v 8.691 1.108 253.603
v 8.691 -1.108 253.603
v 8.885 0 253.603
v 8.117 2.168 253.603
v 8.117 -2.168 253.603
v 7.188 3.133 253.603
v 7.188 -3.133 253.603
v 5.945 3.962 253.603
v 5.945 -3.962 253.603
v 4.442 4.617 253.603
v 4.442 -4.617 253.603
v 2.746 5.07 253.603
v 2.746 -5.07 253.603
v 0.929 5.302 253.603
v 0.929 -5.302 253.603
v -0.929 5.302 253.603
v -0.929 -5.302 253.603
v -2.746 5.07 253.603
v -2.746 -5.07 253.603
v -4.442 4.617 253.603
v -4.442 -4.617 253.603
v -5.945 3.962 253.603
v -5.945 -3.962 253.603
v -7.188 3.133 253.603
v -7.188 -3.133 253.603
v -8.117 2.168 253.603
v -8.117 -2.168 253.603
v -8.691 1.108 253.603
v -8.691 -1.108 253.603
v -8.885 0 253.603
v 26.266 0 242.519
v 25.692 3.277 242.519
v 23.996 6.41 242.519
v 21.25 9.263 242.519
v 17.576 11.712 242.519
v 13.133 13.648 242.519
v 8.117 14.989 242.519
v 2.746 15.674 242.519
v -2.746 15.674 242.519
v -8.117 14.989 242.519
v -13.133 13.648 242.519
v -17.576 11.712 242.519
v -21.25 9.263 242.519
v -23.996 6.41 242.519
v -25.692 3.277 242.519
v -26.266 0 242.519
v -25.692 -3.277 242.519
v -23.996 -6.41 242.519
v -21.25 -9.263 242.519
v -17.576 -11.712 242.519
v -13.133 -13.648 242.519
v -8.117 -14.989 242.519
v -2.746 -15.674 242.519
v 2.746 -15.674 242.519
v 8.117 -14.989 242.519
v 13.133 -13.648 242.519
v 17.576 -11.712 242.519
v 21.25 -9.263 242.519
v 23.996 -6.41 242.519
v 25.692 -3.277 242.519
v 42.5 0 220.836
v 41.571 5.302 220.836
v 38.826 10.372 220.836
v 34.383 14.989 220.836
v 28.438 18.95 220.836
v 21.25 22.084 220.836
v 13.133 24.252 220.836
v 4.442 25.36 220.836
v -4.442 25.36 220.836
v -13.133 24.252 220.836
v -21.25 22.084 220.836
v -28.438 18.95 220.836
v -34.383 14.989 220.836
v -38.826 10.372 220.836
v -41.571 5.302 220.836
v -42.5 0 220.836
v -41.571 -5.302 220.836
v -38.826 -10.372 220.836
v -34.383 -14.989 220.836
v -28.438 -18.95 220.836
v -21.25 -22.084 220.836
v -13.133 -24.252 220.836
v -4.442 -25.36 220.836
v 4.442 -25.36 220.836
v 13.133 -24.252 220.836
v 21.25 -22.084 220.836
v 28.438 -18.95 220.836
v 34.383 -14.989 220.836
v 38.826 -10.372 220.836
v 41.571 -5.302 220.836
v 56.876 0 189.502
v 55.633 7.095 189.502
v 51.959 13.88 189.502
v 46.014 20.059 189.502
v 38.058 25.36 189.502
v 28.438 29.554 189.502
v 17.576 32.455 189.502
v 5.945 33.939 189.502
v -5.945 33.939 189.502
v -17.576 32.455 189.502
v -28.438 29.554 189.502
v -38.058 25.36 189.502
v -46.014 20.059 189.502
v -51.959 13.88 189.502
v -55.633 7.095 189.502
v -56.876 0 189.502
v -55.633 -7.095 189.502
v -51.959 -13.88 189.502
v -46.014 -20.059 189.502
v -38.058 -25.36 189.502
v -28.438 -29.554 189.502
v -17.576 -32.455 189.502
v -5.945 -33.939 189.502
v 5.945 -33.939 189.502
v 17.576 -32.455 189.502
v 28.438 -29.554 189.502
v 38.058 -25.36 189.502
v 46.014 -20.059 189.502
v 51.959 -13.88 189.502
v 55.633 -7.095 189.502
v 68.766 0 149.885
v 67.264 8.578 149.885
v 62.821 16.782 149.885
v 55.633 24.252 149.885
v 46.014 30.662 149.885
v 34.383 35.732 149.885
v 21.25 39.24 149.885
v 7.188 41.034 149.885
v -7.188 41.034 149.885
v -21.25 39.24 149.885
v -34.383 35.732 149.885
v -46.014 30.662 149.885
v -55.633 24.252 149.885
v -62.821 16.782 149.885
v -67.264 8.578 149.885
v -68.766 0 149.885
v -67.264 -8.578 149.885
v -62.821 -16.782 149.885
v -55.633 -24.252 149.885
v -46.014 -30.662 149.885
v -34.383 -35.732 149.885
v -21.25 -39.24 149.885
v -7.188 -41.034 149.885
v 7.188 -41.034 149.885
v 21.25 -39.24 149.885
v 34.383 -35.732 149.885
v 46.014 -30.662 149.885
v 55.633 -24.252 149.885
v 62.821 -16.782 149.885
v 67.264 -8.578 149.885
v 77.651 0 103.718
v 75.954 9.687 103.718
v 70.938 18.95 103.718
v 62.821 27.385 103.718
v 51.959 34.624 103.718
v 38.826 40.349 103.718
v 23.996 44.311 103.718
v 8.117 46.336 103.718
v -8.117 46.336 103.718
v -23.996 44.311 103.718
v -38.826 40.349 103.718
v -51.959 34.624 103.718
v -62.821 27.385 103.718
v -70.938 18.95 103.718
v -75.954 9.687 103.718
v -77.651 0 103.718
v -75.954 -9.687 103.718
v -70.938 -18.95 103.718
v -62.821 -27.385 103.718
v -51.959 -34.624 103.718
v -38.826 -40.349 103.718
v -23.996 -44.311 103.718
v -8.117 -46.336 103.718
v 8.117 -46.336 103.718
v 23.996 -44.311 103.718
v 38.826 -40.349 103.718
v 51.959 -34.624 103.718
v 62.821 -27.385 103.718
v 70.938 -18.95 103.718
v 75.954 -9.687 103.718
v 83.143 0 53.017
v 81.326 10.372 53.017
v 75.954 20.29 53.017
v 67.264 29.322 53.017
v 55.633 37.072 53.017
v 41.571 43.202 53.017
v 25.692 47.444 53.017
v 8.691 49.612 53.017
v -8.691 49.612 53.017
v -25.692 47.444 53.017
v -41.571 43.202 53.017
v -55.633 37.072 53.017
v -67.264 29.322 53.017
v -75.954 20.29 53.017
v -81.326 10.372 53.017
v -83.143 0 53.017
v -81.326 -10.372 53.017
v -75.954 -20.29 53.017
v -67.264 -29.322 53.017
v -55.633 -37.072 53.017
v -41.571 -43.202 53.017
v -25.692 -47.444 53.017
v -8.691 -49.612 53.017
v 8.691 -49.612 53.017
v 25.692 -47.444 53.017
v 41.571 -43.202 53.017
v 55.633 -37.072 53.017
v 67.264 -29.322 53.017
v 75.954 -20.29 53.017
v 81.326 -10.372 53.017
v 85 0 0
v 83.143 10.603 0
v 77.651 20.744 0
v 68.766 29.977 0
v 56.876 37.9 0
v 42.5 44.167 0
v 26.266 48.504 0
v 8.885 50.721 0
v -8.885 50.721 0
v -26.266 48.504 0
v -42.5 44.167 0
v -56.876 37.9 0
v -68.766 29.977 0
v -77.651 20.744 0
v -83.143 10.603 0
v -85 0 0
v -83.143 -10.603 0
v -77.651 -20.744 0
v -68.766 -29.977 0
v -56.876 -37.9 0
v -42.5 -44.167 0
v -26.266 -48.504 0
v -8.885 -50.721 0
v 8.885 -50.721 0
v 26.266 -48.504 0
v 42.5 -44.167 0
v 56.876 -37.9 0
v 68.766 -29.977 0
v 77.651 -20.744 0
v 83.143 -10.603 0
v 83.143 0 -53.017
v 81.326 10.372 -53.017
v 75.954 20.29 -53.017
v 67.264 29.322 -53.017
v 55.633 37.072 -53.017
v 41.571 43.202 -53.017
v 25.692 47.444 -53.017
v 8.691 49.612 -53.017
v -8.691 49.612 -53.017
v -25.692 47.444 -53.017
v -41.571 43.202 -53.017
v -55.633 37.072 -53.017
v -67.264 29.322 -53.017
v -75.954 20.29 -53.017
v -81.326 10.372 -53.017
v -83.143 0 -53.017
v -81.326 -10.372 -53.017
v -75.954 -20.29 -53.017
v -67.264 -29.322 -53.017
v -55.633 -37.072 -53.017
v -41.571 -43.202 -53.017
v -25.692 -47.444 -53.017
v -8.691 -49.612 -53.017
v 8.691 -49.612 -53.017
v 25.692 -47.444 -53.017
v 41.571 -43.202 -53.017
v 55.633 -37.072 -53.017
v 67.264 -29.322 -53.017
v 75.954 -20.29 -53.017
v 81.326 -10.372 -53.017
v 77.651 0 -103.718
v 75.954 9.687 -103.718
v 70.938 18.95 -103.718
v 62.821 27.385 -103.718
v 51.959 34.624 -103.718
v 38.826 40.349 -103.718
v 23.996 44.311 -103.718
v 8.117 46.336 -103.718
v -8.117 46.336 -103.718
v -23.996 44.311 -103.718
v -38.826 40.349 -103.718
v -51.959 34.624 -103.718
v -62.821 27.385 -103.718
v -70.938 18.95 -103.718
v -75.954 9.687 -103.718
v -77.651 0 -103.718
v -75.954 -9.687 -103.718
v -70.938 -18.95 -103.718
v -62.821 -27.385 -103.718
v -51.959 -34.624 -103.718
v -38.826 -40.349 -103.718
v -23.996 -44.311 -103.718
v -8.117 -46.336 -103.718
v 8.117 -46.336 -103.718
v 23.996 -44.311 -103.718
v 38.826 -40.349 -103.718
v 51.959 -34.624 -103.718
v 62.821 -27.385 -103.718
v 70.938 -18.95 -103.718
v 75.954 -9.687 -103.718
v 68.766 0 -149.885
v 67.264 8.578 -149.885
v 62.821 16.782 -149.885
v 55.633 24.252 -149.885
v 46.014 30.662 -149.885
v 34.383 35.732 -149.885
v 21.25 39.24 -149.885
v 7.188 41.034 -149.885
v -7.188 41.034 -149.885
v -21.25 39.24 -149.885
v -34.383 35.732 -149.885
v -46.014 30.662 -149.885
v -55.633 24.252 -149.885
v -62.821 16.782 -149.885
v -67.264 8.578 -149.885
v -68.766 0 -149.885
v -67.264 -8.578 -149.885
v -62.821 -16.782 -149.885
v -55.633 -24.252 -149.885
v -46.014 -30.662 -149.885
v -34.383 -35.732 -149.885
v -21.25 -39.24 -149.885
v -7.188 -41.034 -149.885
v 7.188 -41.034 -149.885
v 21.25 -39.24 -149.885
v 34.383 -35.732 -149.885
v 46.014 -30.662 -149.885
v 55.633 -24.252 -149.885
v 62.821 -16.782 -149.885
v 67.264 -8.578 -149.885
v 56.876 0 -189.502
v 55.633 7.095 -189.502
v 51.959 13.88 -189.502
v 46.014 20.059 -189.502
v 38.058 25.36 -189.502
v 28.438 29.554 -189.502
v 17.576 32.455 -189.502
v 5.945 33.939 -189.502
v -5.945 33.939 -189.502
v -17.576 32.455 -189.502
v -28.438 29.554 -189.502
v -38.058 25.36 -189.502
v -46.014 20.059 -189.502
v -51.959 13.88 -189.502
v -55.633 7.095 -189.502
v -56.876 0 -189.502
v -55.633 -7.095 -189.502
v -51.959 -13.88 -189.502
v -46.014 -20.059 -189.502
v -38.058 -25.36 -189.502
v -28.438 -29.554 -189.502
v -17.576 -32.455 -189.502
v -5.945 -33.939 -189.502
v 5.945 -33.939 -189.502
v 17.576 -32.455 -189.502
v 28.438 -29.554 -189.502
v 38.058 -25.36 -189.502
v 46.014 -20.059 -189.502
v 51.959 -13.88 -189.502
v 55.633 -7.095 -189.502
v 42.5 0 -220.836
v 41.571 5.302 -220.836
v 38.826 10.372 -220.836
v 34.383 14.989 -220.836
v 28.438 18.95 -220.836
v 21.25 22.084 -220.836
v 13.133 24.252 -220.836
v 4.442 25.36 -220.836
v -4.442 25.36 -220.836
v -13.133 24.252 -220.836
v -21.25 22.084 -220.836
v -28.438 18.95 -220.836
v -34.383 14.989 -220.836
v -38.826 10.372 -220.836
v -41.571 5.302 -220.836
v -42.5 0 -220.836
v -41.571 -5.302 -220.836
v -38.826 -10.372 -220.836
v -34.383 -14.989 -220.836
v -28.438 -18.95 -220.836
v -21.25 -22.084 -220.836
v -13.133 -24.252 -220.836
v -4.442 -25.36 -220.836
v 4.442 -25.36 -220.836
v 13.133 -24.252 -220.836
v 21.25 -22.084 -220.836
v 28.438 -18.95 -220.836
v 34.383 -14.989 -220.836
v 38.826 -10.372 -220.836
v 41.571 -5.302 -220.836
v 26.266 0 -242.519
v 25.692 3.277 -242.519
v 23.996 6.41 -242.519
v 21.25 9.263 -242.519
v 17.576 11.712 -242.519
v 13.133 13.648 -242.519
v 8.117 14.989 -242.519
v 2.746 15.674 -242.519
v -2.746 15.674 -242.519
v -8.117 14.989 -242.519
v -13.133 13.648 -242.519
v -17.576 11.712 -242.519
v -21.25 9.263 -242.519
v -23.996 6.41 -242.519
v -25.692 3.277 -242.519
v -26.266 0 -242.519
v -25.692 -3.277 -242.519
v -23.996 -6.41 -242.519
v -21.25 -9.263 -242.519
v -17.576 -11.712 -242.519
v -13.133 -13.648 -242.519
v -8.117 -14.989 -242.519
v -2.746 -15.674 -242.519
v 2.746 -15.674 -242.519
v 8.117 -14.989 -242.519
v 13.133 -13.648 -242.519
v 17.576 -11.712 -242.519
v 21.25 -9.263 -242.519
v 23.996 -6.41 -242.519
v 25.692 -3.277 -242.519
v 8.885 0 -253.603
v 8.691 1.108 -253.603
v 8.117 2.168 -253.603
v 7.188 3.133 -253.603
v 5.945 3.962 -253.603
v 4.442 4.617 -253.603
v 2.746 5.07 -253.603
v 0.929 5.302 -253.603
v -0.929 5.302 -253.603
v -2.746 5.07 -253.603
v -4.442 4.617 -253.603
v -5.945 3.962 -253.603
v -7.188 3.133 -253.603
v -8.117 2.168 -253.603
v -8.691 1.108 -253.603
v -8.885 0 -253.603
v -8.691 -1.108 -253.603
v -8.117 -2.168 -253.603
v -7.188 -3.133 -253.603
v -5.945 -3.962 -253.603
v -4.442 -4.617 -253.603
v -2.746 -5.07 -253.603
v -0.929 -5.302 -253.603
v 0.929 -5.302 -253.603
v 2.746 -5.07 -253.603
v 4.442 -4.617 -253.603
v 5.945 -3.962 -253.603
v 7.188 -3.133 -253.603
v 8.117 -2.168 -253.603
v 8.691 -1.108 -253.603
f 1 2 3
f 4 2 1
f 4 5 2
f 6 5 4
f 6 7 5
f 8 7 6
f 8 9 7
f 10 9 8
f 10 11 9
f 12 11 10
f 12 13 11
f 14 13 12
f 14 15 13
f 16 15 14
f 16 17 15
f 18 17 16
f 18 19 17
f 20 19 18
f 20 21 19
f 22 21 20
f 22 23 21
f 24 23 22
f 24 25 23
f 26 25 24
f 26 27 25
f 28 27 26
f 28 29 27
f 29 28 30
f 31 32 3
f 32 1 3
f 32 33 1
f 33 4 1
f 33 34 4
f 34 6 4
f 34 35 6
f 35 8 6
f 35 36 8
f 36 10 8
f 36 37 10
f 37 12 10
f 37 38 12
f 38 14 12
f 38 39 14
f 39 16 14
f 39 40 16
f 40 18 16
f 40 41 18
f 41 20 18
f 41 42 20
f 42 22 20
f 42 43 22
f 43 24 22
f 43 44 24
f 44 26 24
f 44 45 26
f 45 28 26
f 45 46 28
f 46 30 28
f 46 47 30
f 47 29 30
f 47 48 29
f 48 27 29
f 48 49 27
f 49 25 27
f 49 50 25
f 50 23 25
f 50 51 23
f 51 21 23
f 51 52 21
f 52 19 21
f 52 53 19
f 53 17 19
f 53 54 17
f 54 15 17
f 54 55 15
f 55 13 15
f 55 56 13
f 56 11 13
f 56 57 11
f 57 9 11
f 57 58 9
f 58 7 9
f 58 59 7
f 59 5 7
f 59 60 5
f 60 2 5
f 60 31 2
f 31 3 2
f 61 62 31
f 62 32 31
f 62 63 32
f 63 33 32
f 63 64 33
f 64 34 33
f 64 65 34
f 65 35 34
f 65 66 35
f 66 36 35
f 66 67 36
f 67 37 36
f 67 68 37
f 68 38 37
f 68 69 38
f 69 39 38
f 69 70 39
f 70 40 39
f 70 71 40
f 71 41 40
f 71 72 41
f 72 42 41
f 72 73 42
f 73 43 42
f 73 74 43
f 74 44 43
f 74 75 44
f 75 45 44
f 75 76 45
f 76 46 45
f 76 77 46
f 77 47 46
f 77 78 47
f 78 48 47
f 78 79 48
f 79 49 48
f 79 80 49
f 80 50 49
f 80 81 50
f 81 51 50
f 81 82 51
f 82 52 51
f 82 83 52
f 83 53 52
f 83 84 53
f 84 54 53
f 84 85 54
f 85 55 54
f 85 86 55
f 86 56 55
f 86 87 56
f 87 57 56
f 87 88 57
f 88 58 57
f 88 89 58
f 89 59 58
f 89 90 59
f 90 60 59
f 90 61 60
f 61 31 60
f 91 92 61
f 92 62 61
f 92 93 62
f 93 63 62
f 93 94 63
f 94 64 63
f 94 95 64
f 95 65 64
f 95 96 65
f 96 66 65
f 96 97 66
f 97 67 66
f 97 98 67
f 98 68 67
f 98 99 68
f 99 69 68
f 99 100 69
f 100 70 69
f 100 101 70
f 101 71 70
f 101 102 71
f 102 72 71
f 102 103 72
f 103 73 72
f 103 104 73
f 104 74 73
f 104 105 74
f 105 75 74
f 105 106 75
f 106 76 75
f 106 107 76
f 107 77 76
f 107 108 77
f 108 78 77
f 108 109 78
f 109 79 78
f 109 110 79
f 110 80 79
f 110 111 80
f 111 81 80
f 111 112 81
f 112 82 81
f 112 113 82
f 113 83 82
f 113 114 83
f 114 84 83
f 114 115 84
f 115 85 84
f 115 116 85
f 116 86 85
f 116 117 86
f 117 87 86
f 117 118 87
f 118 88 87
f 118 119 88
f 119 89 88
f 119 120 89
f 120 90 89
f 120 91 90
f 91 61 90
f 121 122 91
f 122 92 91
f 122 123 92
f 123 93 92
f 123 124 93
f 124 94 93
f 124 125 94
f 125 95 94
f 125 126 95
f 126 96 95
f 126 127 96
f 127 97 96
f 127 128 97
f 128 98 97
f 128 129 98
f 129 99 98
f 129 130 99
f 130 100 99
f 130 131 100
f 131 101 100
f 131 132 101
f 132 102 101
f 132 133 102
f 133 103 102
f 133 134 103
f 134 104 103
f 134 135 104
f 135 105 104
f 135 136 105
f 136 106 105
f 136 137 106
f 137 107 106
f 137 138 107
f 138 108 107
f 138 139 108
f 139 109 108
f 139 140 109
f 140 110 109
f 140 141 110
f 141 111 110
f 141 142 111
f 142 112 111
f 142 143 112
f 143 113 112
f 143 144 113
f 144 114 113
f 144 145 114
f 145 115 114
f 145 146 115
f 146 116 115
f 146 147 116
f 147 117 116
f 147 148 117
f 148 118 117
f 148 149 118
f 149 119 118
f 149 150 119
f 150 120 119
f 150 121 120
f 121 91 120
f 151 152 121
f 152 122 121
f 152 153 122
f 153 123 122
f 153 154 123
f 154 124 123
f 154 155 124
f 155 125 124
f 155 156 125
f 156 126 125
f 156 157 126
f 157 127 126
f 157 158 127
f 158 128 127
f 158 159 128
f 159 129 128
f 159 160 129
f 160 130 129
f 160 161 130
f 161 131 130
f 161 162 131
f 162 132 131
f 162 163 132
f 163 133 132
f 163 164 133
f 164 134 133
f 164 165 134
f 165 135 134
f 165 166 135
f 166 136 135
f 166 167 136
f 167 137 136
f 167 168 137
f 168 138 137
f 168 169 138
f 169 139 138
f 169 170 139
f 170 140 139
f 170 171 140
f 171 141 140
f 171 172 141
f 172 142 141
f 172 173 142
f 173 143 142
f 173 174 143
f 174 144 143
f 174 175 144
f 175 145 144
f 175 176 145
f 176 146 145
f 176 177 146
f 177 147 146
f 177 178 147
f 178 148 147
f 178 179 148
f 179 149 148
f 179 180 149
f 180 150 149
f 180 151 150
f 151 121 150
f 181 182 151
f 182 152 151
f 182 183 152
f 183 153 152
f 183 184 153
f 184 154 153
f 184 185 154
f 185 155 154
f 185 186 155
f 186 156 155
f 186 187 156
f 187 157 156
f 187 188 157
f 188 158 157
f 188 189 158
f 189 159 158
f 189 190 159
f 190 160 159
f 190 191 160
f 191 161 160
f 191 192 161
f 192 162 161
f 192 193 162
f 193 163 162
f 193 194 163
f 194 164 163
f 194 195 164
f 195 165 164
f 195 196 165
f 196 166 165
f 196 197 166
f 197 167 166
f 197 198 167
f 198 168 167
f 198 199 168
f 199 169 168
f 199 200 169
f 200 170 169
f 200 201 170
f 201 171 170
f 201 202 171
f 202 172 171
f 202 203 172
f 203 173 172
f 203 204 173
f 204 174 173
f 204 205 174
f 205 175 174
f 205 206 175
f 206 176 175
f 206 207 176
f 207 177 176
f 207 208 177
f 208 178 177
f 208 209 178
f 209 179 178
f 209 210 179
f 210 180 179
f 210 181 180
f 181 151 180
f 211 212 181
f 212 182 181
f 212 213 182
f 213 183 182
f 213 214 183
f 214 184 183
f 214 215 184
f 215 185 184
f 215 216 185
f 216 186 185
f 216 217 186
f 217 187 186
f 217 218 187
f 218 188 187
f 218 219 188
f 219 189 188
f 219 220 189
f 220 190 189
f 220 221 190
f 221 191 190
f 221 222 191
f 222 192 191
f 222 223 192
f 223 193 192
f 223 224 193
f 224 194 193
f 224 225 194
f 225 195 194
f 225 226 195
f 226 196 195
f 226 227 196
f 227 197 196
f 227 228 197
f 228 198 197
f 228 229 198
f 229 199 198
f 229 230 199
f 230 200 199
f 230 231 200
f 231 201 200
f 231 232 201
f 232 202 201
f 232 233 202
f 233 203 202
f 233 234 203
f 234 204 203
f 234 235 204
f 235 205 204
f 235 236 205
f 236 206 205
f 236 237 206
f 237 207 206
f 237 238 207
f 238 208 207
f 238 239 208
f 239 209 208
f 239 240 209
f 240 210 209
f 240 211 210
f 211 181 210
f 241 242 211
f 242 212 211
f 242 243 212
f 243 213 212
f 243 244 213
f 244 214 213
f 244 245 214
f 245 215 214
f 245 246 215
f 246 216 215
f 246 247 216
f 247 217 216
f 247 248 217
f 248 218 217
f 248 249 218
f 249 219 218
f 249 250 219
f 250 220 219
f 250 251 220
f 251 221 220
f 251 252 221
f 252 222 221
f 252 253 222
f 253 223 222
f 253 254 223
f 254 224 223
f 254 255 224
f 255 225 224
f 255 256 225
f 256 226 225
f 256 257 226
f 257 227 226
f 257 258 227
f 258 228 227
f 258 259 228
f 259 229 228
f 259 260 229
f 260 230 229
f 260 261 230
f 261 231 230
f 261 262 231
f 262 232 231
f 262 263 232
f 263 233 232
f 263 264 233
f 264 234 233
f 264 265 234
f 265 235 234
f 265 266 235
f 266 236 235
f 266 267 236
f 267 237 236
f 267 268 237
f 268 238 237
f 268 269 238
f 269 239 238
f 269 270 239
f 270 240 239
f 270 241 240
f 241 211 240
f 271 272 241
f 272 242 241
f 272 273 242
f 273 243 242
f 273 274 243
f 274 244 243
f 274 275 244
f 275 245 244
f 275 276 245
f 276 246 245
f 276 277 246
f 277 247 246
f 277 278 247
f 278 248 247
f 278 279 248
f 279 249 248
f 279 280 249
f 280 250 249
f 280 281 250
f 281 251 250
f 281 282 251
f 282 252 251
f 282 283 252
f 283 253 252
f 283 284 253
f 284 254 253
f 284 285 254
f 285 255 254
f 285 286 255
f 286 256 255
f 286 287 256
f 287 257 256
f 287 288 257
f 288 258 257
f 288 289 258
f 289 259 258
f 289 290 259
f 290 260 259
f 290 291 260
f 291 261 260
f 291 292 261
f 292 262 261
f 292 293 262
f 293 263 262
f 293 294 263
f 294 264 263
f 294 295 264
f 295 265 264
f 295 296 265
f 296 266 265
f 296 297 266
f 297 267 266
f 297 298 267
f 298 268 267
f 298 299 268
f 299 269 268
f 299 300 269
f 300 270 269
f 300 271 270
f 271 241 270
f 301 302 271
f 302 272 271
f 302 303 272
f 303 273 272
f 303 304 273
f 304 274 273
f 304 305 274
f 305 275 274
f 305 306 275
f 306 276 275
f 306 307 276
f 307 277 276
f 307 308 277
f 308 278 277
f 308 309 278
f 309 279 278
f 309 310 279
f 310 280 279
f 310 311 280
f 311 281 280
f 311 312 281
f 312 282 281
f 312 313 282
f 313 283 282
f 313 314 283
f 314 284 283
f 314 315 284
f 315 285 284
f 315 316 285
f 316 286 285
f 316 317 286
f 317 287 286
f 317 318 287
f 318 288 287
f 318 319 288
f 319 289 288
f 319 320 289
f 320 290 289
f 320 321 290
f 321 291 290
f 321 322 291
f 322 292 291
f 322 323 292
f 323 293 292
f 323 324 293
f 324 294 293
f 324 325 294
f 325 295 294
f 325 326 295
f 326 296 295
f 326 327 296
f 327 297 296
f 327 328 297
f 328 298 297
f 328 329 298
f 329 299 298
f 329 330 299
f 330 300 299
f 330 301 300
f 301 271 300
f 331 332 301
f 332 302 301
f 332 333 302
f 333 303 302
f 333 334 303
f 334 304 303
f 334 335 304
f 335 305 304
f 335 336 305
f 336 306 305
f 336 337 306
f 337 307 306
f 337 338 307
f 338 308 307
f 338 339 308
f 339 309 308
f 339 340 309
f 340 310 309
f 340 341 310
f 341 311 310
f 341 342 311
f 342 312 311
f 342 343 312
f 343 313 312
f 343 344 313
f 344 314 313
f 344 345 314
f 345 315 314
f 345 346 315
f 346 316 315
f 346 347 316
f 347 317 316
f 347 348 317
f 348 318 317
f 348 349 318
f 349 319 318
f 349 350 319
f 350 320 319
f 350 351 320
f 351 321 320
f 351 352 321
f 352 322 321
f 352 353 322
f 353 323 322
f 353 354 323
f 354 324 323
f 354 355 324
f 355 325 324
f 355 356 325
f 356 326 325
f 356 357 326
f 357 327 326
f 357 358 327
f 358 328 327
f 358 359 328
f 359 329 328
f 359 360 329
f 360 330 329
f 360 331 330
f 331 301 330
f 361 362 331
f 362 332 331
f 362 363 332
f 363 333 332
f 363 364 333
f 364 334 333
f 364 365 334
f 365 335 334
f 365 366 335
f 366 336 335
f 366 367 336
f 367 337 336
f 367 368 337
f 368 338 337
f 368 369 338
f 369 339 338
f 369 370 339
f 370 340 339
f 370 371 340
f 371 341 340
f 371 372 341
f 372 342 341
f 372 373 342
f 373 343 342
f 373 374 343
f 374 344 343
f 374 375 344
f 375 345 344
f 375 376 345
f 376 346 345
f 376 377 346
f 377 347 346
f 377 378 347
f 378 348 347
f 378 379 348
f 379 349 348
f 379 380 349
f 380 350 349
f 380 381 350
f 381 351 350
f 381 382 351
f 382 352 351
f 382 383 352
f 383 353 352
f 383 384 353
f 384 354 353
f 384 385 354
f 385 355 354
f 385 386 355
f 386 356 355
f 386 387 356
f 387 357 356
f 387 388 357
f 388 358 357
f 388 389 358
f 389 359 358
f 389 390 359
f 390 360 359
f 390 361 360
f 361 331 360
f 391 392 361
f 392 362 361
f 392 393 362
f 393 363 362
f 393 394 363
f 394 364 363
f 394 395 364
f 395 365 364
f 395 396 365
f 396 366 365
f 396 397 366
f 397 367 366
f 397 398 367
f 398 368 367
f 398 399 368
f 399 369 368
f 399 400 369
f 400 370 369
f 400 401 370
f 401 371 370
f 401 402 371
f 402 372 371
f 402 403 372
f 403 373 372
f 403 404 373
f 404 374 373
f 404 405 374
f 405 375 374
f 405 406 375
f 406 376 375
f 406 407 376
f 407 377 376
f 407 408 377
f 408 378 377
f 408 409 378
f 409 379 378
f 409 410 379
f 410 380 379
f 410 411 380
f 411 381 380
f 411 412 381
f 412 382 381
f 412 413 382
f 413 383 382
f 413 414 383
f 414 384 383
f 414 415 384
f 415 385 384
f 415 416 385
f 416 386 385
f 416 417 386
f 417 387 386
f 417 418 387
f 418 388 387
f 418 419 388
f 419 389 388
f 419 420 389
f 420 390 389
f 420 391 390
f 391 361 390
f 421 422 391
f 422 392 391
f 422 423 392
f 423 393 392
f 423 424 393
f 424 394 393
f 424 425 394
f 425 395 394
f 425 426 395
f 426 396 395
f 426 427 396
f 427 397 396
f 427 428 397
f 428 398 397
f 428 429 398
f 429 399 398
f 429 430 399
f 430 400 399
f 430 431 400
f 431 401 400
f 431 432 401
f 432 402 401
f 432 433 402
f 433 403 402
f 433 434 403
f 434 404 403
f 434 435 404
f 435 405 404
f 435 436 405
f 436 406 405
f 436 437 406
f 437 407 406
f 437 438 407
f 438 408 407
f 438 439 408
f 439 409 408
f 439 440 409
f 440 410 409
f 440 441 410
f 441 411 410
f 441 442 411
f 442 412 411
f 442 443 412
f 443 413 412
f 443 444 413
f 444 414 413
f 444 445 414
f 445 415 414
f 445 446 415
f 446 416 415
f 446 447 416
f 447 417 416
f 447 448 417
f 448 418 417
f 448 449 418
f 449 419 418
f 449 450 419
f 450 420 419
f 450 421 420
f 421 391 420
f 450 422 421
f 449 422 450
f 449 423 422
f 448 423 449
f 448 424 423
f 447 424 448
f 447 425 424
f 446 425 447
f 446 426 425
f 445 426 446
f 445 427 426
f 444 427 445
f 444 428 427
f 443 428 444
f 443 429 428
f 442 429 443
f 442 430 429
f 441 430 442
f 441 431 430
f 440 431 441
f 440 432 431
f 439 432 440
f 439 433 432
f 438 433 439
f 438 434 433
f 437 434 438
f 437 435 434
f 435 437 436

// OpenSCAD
// Generated by SolidPython 1.0.1 on 2020-07-29 00:46:46


scale(v = [5, 3, 15]) {
	sphere(r = 17);
}
/***********************************************
*********      SolidPython code:      **********
************************************************
 
# import packages: SolidPython
from solid import *
from solid.utils import *
from itertools import chain, combinations, permutations


class Resize:

    def __init__(self, scad_file):
        self.scad_file = scad_file
        #self.scad_file = import_scad(scad_file)
        # cone/cylinder param:
        self.r1 = 0
        self.r2 = 0
        self.h = 0
        # rectangular prism param:
        self.w = 0
        self.l = 0
        # ellipse param:
        self.r = 0

    # import OpenScad code (file name corresponds to shape)


    # classify shape + parameters
    def assign(self, param1, param2, param3):
        if self.scad_file == 'cone.scad':
            self.r1 = param1
            self.r2 = param2
            self.h = param3
        elif self.scad_file == 'cylinder.scad':
            self.r1 = param1
            self.r2 = param2
            self.h = param3
        elif self.scad_file == 'rectangularPrism.scad':
            self.h = param1
            self.l = param2
            self.w = param3
        else:
            self.r = param1
            self.h = param2

    # resize parameters
    def iterate(self):
        x = range(3, 20, 2)
        i = 1
        if self.scad_file == 'cone.scad':
            tempList = list(permutations(x, 2))
            for temp in tempList:
                param1 = temp[0]
                param2 = temp[1]
                filepath = 'produced_scad_files/' + 'cone' + str(param1) + '_' + str(param2) + '_' + '.scad'
                scad_render_to_file(cylinder(h=param1, r1=param2, r2=0), filepath)

        elif self.scad_file == 'cylinder.scad':
            tempList = list(permutations(x, 3))
            for temp in tempList:
                param1 = temp[0]
                param2 = temp[1]
                filepath = 'produced_scad_files/' + 'cylinder' + str(param1) + '_' + str(param2) + '_' + '.scad'
                scad_render_to_file(cylinder(h=param1, r1=param2, r2=param2), filepath)

        elif self.scad_file == 'rectangularPrism.scad':
            tempList = list(permutations(x, 3))
            for temp in tempList:
                param1 = temp[0]
                param2 = temp[1]
                param3 = temp[2]
                filepath = 'produced_scad_files/' + 'rectangularPrism' + str(param1) + '_' + str(param2) + '_' + str(
                    param3) + '.scad'
                scad_render_to_file(cube(size=(param1, param2, param3)), filepath)

        elif self.scad_file == 'ellipse.scad':
            tempList = list(permutations(x, 4))
            for temp in tempList:
                param1 = temp[0]
                param2 = temp[1]
                param3 = temp[2]
                param4 = temp[3]
                filepath = 'produced_scad_files/' + 'ellipse' + str(param1) + '_' + str(param2) + '_' + str(param3) + '_' + str(param4) + '.scad'
                scad_render_to_file(scale([param1, param2, param3])(sphere(r=param4)), filepath)

    def render_to_scadfile(self):
        scad_render_to_file(scad, 'example.scad') 
 
************************************************/
